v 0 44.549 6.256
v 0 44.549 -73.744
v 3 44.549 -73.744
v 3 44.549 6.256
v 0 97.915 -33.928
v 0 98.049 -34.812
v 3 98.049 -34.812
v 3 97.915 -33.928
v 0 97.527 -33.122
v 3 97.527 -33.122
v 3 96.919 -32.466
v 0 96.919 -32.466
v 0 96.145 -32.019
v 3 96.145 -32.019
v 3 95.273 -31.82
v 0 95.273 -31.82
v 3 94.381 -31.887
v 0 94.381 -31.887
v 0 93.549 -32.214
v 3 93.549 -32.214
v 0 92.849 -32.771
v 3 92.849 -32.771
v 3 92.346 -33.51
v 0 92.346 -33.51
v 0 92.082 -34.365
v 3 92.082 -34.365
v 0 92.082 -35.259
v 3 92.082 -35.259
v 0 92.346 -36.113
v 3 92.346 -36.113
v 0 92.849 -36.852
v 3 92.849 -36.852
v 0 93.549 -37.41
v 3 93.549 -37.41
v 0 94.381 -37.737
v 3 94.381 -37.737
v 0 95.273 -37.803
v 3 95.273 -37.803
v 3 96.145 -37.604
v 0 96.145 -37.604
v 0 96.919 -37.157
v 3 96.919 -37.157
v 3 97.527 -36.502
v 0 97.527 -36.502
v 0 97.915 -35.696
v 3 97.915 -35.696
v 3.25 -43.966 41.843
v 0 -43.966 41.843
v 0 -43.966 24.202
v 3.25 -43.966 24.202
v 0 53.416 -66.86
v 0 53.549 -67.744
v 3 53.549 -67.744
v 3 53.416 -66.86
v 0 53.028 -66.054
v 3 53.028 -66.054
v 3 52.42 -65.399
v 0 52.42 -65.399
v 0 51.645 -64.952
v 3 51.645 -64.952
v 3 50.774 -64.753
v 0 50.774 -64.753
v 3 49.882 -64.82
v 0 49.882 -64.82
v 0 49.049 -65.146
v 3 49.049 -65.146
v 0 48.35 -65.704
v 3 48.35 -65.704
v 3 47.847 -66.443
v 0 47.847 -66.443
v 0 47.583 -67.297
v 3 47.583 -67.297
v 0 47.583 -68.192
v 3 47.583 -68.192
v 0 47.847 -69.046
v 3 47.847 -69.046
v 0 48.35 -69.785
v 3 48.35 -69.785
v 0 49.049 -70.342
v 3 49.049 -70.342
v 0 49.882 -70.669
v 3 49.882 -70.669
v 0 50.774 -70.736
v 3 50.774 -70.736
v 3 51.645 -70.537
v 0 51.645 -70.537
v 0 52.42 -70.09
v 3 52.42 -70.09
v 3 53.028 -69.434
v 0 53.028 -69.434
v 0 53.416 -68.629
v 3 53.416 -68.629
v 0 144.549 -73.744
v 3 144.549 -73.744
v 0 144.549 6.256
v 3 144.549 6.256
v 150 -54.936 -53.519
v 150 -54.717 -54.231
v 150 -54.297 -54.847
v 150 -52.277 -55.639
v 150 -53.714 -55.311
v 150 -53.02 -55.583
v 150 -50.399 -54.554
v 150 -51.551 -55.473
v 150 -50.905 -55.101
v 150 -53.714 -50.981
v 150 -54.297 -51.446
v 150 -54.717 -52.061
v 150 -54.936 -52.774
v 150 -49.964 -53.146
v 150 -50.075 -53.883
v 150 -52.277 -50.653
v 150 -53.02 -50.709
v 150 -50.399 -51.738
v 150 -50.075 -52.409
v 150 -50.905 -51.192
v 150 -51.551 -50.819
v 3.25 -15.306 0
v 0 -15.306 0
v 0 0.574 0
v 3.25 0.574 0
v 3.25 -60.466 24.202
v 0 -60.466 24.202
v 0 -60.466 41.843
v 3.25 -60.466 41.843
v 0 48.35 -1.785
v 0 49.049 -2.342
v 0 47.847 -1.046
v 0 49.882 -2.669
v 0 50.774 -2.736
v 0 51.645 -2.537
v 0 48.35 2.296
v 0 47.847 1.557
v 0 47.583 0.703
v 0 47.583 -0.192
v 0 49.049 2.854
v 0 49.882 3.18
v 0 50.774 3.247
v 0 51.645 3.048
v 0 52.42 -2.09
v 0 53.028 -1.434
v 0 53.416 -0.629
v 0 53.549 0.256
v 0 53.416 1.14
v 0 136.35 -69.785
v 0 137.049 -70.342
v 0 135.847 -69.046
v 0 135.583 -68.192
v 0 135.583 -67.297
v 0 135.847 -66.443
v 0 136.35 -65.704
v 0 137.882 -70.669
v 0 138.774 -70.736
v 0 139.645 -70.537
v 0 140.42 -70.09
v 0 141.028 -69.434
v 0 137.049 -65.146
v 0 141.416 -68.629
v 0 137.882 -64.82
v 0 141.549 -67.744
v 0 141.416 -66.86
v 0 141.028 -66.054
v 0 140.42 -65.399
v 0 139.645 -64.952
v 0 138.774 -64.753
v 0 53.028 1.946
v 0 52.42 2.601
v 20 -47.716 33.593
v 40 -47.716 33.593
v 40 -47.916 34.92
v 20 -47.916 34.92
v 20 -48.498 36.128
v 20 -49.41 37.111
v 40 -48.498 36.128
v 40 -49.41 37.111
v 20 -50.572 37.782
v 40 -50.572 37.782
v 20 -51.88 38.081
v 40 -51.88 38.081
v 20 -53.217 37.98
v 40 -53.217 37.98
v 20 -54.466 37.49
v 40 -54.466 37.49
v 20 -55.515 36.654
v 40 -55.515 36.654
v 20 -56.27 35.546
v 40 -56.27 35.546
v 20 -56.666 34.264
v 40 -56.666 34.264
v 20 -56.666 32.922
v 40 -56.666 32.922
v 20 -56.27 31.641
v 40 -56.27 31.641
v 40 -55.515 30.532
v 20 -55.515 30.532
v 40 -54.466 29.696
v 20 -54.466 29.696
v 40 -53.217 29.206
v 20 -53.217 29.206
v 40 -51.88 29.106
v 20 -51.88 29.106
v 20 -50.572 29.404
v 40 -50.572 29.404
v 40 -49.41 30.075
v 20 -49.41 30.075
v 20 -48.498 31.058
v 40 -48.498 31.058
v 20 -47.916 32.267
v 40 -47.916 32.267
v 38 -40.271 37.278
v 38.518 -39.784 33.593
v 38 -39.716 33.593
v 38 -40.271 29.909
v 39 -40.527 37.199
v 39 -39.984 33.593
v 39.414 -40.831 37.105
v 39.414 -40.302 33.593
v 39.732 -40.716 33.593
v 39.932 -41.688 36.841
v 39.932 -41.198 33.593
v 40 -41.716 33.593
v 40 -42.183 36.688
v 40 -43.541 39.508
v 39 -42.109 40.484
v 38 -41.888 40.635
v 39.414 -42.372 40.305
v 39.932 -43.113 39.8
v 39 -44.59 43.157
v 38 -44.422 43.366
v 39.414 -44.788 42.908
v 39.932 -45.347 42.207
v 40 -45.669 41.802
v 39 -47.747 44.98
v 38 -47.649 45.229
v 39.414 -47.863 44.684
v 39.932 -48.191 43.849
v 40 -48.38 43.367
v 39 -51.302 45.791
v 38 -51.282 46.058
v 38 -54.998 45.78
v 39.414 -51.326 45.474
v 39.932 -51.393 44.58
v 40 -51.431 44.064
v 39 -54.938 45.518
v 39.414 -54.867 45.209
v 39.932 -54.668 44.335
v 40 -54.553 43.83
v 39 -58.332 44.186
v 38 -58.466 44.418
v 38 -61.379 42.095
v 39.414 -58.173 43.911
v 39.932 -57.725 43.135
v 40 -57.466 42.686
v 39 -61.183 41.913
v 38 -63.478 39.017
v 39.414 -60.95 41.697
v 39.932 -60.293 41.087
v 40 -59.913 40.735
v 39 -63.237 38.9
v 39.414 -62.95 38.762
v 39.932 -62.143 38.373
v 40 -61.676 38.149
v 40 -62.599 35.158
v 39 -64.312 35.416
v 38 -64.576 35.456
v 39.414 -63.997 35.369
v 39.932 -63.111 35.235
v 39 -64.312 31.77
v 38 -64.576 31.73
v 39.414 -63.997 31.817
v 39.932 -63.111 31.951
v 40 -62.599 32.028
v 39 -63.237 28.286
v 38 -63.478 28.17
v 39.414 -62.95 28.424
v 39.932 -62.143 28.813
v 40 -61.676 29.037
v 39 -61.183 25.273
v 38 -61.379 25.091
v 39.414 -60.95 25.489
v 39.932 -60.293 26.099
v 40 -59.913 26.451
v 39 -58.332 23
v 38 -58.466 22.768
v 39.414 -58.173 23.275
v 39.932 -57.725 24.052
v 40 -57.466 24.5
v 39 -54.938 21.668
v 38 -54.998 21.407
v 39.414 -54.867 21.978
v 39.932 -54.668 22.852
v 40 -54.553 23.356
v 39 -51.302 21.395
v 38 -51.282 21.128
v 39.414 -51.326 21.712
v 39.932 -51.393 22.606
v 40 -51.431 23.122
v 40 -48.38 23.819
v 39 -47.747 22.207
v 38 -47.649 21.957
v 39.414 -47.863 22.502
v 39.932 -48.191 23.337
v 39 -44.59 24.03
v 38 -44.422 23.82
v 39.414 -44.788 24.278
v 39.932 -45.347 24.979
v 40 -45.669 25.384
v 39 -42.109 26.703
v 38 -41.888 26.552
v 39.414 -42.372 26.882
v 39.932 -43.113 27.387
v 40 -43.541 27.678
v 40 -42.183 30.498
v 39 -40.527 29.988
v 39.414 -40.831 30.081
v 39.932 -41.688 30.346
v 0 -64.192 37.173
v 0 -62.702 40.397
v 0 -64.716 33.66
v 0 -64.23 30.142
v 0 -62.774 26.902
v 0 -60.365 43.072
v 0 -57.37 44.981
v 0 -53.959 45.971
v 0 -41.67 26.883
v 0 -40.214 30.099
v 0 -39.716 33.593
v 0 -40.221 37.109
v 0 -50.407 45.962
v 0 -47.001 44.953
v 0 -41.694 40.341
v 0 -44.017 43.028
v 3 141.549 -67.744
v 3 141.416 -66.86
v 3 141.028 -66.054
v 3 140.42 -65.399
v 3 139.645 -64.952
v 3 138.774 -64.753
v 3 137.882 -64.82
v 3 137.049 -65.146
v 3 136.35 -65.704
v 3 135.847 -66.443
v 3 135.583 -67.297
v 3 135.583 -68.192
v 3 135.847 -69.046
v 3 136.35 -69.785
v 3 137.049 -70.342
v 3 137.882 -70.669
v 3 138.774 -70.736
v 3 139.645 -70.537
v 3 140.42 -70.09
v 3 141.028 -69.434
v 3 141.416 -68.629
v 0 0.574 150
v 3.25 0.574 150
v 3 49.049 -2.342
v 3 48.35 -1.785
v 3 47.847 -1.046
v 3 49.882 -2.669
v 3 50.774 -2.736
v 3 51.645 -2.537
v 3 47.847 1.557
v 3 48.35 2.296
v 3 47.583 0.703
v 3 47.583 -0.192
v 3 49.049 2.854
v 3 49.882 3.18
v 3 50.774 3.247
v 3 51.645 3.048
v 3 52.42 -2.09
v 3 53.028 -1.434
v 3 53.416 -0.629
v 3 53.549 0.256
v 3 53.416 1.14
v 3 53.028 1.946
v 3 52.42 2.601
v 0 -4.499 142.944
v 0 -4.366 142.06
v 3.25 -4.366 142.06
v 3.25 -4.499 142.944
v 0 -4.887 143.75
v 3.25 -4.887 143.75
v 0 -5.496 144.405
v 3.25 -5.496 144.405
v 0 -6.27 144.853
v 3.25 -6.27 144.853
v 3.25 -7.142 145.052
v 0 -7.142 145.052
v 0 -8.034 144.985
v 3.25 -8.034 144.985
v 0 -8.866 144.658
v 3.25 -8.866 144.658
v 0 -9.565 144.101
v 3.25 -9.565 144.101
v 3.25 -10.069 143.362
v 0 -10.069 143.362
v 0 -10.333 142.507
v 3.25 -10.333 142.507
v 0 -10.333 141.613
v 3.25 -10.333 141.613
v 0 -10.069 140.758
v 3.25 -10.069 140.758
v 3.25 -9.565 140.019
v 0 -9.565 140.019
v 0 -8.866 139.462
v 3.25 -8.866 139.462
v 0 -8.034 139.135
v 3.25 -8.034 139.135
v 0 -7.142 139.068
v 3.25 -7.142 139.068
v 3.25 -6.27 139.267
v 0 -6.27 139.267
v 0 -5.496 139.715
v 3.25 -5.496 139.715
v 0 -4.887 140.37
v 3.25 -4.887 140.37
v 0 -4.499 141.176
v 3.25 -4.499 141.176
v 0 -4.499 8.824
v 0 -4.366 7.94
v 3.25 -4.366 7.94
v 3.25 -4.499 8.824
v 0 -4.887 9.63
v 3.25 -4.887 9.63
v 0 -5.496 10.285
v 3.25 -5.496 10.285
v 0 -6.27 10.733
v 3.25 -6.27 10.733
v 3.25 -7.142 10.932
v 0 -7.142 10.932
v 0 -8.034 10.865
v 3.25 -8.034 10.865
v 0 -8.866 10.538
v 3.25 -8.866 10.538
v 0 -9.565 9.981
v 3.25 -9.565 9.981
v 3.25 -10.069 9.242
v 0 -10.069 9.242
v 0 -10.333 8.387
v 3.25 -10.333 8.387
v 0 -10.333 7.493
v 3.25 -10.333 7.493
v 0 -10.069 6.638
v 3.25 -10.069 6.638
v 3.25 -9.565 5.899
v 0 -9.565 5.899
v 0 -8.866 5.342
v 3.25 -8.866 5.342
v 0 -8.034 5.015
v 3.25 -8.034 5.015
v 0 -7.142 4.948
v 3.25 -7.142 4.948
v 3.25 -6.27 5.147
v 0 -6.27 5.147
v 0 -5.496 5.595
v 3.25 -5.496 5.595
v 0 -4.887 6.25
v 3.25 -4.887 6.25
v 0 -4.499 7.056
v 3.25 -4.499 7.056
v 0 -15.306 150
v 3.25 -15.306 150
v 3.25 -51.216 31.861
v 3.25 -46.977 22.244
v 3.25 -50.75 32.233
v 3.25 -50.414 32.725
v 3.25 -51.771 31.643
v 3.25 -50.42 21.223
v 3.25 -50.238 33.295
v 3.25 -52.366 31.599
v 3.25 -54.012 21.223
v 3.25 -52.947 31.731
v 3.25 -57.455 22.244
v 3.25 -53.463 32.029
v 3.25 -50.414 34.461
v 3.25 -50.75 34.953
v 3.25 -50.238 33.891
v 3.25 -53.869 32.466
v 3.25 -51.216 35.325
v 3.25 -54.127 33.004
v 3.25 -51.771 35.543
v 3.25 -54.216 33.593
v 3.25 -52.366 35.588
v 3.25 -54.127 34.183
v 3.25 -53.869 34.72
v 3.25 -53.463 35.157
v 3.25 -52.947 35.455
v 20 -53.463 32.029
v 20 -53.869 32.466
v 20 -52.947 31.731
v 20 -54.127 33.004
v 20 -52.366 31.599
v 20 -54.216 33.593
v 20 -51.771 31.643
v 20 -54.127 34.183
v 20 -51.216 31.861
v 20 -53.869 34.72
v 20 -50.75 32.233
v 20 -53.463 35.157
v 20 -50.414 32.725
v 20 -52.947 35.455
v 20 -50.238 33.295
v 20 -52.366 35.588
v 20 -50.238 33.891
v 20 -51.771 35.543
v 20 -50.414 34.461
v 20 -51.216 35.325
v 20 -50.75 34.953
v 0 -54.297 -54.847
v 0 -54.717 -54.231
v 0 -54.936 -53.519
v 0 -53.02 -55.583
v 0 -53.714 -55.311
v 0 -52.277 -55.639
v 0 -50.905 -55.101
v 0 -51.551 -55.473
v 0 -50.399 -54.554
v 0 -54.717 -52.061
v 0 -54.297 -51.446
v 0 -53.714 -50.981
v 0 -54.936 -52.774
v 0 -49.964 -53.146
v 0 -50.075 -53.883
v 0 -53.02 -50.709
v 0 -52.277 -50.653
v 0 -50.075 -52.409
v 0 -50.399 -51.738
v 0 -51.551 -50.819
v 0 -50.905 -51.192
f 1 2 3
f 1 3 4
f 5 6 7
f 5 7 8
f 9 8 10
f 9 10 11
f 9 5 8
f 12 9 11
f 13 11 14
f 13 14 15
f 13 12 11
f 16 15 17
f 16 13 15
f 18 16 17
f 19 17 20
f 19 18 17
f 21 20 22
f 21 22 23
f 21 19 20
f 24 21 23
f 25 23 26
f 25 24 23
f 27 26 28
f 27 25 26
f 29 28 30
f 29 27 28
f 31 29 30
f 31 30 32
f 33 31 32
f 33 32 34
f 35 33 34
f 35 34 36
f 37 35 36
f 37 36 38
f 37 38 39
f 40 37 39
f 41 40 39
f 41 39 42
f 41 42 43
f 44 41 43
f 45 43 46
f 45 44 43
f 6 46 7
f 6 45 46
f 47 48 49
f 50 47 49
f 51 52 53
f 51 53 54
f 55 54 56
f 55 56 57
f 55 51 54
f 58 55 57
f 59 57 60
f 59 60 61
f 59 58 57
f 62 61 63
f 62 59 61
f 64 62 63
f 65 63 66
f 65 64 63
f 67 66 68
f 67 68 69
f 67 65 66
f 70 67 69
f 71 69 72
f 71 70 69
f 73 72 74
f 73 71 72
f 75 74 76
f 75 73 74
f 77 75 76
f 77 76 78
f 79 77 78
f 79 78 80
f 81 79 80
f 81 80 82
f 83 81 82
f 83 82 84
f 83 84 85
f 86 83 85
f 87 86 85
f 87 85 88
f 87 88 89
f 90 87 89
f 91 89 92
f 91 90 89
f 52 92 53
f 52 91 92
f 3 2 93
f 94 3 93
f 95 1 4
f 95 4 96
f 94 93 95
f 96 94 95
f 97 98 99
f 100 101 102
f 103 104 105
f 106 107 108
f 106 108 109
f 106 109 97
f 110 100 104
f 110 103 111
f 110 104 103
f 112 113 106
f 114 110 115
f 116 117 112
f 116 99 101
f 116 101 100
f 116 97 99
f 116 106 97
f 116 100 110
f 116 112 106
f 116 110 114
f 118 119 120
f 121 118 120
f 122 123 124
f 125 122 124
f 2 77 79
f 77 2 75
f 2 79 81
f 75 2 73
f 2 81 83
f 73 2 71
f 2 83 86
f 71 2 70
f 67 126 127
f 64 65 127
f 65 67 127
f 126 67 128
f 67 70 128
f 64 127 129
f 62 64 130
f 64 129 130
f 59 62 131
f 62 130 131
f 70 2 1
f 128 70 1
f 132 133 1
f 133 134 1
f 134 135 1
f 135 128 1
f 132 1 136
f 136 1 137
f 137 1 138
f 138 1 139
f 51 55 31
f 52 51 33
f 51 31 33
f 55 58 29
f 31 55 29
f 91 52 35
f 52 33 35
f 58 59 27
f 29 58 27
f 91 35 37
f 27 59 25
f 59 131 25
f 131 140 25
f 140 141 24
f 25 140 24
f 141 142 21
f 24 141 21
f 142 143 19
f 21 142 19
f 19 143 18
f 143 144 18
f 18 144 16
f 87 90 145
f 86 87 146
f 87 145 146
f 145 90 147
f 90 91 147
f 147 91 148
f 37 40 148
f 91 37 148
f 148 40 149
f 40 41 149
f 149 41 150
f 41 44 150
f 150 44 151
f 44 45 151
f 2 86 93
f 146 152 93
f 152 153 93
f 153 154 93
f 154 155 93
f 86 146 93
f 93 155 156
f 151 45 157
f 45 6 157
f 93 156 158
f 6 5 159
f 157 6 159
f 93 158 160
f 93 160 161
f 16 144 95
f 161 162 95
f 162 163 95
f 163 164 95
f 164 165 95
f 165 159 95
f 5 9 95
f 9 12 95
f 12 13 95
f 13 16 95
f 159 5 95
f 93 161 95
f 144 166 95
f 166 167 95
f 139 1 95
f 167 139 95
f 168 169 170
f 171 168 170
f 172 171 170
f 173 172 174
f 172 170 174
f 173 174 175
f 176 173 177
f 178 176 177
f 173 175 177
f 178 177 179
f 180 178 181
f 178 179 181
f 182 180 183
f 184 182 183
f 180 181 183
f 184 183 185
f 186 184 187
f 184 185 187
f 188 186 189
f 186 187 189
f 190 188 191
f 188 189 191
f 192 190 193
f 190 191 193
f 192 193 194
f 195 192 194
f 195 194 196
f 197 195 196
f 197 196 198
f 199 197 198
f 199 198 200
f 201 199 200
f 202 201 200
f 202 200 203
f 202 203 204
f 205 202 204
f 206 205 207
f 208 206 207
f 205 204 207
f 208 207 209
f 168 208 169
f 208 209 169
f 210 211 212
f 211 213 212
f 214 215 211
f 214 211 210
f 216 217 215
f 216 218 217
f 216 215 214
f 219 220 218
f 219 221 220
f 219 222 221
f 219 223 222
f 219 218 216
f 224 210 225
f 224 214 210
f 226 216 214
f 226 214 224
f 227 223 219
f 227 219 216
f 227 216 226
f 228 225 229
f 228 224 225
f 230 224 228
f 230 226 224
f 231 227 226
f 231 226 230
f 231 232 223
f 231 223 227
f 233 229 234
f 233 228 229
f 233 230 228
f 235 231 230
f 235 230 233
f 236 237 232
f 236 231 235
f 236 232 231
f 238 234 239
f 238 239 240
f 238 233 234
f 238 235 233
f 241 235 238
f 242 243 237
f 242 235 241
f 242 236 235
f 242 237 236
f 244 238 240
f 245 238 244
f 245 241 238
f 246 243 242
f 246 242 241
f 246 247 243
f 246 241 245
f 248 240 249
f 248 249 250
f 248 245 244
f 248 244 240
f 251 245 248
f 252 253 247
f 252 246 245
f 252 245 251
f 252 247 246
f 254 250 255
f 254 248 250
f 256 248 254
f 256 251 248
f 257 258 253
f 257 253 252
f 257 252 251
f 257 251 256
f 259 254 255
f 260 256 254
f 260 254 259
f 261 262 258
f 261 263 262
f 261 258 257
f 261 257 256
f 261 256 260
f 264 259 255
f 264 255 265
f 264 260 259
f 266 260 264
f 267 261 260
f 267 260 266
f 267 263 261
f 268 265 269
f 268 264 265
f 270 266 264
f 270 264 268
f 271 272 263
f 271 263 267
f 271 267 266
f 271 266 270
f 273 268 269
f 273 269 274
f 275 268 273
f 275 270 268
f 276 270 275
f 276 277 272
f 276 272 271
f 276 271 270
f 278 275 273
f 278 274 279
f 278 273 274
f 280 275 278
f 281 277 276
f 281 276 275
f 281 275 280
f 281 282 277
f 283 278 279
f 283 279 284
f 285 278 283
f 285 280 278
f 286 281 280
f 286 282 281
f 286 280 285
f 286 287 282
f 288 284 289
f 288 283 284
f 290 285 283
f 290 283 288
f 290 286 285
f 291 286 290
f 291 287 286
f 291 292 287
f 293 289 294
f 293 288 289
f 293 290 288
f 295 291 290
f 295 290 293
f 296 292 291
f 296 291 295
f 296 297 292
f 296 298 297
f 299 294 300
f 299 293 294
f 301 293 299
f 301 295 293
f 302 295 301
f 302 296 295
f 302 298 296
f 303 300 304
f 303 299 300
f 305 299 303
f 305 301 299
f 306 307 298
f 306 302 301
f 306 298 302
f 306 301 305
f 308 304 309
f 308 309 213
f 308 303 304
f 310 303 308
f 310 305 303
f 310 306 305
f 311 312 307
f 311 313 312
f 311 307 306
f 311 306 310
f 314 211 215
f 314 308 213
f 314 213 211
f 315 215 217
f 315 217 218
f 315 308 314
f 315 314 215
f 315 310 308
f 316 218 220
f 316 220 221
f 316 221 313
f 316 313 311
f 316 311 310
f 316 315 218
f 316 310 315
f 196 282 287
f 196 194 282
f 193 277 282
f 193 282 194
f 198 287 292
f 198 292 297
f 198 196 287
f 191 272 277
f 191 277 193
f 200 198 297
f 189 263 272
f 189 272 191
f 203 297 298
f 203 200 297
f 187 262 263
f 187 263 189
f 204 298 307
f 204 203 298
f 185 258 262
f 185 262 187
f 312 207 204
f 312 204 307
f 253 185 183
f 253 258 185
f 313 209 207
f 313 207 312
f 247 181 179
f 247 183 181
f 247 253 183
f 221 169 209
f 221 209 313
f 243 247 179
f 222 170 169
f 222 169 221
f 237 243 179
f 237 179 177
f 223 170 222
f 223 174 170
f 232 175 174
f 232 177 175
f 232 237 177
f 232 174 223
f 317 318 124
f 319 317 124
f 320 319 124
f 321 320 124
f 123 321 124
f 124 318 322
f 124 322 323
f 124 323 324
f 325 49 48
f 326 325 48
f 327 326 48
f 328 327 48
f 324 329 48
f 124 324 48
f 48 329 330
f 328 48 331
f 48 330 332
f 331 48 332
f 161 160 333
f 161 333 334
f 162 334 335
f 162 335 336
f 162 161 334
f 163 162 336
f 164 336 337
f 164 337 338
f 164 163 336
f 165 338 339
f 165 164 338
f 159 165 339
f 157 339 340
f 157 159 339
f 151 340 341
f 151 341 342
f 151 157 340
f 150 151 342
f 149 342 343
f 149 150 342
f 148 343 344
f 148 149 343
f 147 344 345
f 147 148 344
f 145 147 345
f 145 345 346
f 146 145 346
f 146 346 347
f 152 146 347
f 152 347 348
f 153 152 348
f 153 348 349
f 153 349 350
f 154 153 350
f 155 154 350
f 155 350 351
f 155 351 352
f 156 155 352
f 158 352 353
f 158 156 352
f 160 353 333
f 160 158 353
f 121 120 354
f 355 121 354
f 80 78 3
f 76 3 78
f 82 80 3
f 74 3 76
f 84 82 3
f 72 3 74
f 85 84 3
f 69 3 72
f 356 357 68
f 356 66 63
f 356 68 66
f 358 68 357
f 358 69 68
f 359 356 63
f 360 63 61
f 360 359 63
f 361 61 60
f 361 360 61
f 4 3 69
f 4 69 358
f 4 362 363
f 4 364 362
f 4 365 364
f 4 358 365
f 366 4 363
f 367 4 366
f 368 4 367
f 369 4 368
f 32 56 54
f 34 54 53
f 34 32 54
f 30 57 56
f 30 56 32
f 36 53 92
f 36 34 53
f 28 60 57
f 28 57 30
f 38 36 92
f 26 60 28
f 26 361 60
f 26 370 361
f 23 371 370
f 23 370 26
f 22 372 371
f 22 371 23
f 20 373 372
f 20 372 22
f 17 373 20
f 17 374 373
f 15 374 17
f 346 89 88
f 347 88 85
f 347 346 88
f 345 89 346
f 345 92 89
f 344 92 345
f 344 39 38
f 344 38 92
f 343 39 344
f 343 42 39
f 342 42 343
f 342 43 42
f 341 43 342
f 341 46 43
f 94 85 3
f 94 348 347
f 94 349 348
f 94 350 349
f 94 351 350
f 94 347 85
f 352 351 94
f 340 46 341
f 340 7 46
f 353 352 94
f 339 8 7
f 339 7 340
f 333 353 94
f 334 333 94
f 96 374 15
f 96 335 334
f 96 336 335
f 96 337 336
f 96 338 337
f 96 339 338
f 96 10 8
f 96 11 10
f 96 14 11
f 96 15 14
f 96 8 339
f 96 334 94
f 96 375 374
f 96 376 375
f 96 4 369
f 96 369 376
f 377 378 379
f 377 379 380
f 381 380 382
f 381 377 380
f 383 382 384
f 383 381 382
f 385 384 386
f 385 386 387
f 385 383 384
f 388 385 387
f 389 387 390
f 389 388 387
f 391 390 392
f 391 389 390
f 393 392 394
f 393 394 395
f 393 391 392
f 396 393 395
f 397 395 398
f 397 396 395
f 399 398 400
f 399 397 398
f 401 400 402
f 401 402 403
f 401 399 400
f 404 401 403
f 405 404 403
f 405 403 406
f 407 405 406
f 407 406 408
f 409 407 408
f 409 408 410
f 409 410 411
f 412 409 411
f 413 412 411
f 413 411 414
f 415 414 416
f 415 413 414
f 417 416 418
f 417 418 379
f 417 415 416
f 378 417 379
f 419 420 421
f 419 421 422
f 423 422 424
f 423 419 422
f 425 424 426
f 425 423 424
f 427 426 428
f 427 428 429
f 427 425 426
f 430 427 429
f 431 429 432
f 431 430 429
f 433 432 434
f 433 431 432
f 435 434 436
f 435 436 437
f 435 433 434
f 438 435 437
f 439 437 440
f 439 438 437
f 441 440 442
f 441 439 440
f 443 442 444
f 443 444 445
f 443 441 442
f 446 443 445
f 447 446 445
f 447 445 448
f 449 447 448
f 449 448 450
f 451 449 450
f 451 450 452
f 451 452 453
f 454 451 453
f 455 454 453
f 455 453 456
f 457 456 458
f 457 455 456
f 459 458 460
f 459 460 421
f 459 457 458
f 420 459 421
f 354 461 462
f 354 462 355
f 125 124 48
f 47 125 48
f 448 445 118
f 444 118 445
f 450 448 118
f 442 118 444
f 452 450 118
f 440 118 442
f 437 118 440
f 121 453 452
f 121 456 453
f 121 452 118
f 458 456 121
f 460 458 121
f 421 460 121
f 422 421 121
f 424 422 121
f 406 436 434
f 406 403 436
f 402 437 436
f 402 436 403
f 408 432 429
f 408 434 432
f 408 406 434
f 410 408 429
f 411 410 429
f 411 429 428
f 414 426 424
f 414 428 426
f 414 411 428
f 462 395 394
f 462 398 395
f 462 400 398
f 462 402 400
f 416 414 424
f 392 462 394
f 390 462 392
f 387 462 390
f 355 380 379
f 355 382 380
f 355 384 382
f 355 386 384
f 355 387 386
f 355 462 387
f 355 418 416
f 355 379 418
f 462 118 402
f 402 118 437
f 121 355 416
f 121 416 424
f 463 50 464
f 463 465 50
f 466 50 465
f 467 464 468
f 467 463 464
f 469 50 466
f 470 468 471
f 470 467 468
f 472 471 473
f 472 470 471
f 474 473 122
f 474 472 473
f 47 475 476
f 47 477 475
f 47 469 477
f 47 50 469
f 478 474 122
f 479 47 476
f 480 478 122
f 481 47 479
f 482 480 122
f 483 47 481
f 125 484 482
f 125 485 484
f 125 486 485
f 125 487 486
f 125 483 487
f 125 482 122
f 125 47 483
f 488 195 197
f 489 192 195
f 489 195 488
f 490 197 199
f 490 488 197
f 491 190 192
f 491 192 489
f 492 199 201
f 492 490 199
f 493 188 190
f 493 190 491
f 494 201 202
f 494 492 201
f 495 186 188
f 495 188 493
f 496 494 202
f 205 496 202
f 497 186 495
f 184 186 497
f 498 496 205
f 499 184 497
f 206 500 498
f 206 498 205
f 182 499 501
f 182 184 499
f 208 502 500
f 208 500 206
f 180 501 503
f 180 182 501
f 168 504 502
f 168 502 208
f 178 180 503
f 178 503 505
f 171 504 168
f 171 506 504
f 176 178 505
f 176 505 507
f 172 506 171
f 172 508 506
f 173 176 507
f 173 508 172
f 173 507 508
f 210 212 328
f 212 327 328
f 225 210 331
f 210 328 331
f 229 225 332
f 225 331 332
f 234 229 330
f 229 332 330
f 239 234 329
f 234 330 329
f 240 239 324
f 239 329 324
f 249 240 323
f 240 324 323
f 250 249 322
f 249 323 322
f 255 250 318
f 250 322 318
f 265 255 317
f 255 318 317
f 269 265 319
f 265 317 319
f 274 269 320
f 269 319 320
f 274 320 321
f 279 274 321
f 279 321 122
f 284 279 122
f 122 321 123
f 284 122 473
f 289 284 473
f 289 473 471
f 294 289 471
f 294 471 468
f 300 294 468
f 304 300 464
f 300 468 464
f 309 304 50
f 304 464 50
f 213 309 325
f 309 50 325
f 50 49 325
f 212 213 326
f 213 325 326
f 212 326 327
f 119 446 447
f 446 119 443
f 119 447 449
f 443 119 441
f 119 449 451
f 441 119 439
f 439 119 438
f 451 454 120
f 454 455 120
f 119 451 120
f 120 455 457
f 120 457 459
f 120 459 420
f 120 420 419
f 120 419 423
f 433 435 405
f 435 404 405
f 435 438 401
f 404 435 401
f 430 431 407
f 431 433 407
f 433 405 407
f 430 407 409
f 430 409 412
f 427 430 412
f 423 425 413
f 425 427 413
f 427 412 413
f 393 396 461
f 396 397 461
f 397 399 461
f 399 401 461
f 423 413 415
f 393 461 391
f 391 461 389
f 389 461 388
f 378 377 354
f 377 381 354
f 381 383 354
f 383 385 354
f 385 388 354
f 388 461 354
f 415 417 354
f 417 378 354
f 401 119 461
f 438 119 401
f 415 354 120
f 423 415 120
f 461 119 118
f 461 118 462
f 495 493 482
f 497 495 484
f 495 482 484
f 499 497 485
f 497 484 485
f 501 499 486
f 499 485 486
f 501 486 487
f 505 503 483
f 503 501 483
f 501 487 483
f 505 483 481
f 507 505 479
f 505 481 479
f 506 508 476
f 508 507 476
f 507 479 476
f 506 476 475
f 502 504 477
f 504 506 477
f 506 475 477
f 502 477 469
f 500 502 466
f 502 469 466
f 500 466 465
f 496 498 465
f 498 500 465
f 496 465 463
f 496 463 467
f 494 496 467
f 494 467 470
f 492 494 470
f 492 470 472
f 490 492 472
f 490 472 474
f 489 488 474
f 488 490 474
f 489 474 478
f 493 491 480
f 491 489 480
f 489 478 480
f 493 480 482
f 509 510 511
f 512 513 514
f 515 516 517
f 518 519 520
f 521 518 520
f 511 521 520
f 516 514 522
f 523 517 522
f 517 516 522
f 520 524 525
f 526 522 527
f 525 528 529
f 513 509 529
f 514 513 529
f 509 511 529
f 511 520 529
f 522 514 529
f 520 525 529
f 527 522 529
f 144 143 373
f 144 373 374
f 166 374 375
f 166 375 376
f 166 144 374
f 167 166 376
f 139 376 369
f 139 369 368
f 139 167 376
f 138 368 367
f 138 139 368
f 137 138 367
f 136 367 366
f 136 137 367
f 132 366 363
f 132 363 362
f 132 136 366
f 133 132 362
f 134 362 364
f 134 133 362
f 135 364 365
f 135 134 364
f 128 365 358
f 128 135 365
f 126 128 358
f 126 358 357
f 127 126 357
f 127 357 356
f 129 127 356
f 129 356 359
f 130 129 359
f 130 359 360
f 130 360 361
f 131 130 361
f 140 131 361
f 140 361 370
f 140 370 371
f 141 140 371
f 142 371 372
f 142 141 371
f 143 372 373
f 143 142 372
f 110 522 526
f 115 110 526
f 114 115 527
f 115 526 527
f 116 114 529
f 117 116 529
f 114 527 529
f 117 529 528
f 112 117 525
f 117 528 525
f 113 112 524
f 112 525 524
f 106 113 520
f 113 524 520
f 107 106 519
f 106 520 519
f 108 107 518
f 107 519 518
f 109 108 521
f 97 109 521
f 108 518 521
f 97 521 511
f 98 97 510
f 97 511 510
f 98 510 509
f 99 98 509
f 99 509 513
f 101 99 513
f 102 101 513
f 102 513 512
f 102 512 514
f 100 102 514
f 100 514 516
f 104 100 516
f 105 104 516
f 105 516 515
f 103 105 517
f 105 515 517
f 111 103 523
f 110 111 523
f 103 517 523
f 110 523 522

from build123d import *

# Parameters (mm, degrees)
F2_W      = 15.88
F2_H      = 150
F2_R      = 3
F3_DEPTH  = 3.25
F4_R      = 12.5
F5_DEPTH  = 40
F6_R      = 2
F7_DEPTH  = 40
F8_R      = 4.5
F8_R_2    = 2
F9_DEPTH  = 20
F10_R     = 2
F11_R     = 2
F12_DEPTH = 3.25
F13_R     = 2.5
F14_DEPTH = 150
F15_W     = 100
F15_H     = 80
F15_R     = 3
F16_DEPTH = 3


with BuildPart() as f3:
    # F2 (on Right) → F3 (new body)
    with BuildSketch(Plane.YZ):
        with Locations((-7.3661215442, 75)):
            Rectangle(F2_W, F2_H)
        with Locations((-7.3661215442, 7.94)):
            Circle(F2_R, mode=Mode.SUBTRACT)
        with Locations((-7.3661215442, 142.06)):
            Circle(F2_R, mode=Mode.SUBTRACT)
    extrude(amount=F3_DEPTH)


with BuildPart() as f5:
    # F4 (on Right) → F5 (new body)
    with BuildSketch(Plane.YZ):
        with Locations((-52.2160716355, 33.5931144655)):
            Circle(F4_R)
    extrude(amount=F5_DEPTH)

    # F6 (on face) → F7 (cut, through all)
    with BuildSketch(Plane(origin=(0, 0, 0), x_dir=(0, -1, 0), z_dir=(-1, 0, 0))):
        with Locations((52.2160716355, 33.5931144655)):
            Circle(F6_R)
    extrude(amount=-F7_DEPTH, mode=Mode.SUBTRACT)

    # F8 (on face) → F9 (cut)
    with BuildSketch(Plane.YZ.offset(40)):
        with Locations((-52.2160716355, 33.5931144655)):
            Circle(F8_R)
        with Locations((-52.2160716355, 33.5931144655)):
            Circle(F8_R_2, mode=Mode.SUBTRACT)
    extrude(amount=-F9_DEPTH, mode=Mode.SUBTRACT)

    # F10
    f10_edges = [f5.edges().sort_by_distance(p)[0] for p in [
        (40, -64.716072, 33.593114),
    ]]
    fillet(f10_edges, radius=F10_R)

    # F11 (on face) → F12 (cut)
    with BuildSketch(Plane(origin=(0, 0, 0), x_dir=(0, -1, 0), z_dir=(-1, 0, 0))):
        with BuildLine():
            Line((43.9660716355, 41.8431144655), (43.9660716355, 24.20229448))
            ThreePointArc((43.9660716355, 24.20229448), (52.2160716355, 21.0931144655), (60.4660716355, 24.20229448))
            Line((60.4660716355, 24.20229448), (60.4660716355, 41.8431144655))
            Line((60.4660716355, 41.8431144655), (43.9660716355, 41.8431144655))
        make_face()
        with Locations((52.2160716355, 33.5931144655)):
            Circle(F11_R, mode=Mode.SUBTRACT)
    extrude(amount=-F12_DEPTH, mode=Mode.SUBTRACT)


with BuildPart() as f14:
    # F13 (on Right) → F14 (new body)
    with BuildSketch(Plane.YZ):
        with Locations((-52.46412009, -53.1461387873)):
            Circle(F13_R)
    extrude(amount=F14_DEPTH)


with BuildPart() as f16:
    # F15 (on Right) → F16 (new body)
    with BuildSketch(Plane.YZ):
        with Locations((94.5494233072, -33.7444189344)):
            Rectangle(F15_W, F15_H)
        with Locations((50.5494233072, -67.7444189344)):
            Circle(F15_R, mode=Mode.SUBTRACT)
        with Locations((138.5494233072, -67.7444189344)):
            Circle(F15_R, mode=Mode.SUBTRACT)
        with Locations((95.0485393405, -34.8118245602)):
            Circle(F15_R, mode=Mode.SUBTRACT)
        with Locations((50.5494233072, 0.2555810656)):
            Circle(F15_R, mode=Mode.SUBTRACT)
    extrude(amount=F16_DEPTH)


solid = Compound([f3.part, f5.part, f14.part, f16.part])
